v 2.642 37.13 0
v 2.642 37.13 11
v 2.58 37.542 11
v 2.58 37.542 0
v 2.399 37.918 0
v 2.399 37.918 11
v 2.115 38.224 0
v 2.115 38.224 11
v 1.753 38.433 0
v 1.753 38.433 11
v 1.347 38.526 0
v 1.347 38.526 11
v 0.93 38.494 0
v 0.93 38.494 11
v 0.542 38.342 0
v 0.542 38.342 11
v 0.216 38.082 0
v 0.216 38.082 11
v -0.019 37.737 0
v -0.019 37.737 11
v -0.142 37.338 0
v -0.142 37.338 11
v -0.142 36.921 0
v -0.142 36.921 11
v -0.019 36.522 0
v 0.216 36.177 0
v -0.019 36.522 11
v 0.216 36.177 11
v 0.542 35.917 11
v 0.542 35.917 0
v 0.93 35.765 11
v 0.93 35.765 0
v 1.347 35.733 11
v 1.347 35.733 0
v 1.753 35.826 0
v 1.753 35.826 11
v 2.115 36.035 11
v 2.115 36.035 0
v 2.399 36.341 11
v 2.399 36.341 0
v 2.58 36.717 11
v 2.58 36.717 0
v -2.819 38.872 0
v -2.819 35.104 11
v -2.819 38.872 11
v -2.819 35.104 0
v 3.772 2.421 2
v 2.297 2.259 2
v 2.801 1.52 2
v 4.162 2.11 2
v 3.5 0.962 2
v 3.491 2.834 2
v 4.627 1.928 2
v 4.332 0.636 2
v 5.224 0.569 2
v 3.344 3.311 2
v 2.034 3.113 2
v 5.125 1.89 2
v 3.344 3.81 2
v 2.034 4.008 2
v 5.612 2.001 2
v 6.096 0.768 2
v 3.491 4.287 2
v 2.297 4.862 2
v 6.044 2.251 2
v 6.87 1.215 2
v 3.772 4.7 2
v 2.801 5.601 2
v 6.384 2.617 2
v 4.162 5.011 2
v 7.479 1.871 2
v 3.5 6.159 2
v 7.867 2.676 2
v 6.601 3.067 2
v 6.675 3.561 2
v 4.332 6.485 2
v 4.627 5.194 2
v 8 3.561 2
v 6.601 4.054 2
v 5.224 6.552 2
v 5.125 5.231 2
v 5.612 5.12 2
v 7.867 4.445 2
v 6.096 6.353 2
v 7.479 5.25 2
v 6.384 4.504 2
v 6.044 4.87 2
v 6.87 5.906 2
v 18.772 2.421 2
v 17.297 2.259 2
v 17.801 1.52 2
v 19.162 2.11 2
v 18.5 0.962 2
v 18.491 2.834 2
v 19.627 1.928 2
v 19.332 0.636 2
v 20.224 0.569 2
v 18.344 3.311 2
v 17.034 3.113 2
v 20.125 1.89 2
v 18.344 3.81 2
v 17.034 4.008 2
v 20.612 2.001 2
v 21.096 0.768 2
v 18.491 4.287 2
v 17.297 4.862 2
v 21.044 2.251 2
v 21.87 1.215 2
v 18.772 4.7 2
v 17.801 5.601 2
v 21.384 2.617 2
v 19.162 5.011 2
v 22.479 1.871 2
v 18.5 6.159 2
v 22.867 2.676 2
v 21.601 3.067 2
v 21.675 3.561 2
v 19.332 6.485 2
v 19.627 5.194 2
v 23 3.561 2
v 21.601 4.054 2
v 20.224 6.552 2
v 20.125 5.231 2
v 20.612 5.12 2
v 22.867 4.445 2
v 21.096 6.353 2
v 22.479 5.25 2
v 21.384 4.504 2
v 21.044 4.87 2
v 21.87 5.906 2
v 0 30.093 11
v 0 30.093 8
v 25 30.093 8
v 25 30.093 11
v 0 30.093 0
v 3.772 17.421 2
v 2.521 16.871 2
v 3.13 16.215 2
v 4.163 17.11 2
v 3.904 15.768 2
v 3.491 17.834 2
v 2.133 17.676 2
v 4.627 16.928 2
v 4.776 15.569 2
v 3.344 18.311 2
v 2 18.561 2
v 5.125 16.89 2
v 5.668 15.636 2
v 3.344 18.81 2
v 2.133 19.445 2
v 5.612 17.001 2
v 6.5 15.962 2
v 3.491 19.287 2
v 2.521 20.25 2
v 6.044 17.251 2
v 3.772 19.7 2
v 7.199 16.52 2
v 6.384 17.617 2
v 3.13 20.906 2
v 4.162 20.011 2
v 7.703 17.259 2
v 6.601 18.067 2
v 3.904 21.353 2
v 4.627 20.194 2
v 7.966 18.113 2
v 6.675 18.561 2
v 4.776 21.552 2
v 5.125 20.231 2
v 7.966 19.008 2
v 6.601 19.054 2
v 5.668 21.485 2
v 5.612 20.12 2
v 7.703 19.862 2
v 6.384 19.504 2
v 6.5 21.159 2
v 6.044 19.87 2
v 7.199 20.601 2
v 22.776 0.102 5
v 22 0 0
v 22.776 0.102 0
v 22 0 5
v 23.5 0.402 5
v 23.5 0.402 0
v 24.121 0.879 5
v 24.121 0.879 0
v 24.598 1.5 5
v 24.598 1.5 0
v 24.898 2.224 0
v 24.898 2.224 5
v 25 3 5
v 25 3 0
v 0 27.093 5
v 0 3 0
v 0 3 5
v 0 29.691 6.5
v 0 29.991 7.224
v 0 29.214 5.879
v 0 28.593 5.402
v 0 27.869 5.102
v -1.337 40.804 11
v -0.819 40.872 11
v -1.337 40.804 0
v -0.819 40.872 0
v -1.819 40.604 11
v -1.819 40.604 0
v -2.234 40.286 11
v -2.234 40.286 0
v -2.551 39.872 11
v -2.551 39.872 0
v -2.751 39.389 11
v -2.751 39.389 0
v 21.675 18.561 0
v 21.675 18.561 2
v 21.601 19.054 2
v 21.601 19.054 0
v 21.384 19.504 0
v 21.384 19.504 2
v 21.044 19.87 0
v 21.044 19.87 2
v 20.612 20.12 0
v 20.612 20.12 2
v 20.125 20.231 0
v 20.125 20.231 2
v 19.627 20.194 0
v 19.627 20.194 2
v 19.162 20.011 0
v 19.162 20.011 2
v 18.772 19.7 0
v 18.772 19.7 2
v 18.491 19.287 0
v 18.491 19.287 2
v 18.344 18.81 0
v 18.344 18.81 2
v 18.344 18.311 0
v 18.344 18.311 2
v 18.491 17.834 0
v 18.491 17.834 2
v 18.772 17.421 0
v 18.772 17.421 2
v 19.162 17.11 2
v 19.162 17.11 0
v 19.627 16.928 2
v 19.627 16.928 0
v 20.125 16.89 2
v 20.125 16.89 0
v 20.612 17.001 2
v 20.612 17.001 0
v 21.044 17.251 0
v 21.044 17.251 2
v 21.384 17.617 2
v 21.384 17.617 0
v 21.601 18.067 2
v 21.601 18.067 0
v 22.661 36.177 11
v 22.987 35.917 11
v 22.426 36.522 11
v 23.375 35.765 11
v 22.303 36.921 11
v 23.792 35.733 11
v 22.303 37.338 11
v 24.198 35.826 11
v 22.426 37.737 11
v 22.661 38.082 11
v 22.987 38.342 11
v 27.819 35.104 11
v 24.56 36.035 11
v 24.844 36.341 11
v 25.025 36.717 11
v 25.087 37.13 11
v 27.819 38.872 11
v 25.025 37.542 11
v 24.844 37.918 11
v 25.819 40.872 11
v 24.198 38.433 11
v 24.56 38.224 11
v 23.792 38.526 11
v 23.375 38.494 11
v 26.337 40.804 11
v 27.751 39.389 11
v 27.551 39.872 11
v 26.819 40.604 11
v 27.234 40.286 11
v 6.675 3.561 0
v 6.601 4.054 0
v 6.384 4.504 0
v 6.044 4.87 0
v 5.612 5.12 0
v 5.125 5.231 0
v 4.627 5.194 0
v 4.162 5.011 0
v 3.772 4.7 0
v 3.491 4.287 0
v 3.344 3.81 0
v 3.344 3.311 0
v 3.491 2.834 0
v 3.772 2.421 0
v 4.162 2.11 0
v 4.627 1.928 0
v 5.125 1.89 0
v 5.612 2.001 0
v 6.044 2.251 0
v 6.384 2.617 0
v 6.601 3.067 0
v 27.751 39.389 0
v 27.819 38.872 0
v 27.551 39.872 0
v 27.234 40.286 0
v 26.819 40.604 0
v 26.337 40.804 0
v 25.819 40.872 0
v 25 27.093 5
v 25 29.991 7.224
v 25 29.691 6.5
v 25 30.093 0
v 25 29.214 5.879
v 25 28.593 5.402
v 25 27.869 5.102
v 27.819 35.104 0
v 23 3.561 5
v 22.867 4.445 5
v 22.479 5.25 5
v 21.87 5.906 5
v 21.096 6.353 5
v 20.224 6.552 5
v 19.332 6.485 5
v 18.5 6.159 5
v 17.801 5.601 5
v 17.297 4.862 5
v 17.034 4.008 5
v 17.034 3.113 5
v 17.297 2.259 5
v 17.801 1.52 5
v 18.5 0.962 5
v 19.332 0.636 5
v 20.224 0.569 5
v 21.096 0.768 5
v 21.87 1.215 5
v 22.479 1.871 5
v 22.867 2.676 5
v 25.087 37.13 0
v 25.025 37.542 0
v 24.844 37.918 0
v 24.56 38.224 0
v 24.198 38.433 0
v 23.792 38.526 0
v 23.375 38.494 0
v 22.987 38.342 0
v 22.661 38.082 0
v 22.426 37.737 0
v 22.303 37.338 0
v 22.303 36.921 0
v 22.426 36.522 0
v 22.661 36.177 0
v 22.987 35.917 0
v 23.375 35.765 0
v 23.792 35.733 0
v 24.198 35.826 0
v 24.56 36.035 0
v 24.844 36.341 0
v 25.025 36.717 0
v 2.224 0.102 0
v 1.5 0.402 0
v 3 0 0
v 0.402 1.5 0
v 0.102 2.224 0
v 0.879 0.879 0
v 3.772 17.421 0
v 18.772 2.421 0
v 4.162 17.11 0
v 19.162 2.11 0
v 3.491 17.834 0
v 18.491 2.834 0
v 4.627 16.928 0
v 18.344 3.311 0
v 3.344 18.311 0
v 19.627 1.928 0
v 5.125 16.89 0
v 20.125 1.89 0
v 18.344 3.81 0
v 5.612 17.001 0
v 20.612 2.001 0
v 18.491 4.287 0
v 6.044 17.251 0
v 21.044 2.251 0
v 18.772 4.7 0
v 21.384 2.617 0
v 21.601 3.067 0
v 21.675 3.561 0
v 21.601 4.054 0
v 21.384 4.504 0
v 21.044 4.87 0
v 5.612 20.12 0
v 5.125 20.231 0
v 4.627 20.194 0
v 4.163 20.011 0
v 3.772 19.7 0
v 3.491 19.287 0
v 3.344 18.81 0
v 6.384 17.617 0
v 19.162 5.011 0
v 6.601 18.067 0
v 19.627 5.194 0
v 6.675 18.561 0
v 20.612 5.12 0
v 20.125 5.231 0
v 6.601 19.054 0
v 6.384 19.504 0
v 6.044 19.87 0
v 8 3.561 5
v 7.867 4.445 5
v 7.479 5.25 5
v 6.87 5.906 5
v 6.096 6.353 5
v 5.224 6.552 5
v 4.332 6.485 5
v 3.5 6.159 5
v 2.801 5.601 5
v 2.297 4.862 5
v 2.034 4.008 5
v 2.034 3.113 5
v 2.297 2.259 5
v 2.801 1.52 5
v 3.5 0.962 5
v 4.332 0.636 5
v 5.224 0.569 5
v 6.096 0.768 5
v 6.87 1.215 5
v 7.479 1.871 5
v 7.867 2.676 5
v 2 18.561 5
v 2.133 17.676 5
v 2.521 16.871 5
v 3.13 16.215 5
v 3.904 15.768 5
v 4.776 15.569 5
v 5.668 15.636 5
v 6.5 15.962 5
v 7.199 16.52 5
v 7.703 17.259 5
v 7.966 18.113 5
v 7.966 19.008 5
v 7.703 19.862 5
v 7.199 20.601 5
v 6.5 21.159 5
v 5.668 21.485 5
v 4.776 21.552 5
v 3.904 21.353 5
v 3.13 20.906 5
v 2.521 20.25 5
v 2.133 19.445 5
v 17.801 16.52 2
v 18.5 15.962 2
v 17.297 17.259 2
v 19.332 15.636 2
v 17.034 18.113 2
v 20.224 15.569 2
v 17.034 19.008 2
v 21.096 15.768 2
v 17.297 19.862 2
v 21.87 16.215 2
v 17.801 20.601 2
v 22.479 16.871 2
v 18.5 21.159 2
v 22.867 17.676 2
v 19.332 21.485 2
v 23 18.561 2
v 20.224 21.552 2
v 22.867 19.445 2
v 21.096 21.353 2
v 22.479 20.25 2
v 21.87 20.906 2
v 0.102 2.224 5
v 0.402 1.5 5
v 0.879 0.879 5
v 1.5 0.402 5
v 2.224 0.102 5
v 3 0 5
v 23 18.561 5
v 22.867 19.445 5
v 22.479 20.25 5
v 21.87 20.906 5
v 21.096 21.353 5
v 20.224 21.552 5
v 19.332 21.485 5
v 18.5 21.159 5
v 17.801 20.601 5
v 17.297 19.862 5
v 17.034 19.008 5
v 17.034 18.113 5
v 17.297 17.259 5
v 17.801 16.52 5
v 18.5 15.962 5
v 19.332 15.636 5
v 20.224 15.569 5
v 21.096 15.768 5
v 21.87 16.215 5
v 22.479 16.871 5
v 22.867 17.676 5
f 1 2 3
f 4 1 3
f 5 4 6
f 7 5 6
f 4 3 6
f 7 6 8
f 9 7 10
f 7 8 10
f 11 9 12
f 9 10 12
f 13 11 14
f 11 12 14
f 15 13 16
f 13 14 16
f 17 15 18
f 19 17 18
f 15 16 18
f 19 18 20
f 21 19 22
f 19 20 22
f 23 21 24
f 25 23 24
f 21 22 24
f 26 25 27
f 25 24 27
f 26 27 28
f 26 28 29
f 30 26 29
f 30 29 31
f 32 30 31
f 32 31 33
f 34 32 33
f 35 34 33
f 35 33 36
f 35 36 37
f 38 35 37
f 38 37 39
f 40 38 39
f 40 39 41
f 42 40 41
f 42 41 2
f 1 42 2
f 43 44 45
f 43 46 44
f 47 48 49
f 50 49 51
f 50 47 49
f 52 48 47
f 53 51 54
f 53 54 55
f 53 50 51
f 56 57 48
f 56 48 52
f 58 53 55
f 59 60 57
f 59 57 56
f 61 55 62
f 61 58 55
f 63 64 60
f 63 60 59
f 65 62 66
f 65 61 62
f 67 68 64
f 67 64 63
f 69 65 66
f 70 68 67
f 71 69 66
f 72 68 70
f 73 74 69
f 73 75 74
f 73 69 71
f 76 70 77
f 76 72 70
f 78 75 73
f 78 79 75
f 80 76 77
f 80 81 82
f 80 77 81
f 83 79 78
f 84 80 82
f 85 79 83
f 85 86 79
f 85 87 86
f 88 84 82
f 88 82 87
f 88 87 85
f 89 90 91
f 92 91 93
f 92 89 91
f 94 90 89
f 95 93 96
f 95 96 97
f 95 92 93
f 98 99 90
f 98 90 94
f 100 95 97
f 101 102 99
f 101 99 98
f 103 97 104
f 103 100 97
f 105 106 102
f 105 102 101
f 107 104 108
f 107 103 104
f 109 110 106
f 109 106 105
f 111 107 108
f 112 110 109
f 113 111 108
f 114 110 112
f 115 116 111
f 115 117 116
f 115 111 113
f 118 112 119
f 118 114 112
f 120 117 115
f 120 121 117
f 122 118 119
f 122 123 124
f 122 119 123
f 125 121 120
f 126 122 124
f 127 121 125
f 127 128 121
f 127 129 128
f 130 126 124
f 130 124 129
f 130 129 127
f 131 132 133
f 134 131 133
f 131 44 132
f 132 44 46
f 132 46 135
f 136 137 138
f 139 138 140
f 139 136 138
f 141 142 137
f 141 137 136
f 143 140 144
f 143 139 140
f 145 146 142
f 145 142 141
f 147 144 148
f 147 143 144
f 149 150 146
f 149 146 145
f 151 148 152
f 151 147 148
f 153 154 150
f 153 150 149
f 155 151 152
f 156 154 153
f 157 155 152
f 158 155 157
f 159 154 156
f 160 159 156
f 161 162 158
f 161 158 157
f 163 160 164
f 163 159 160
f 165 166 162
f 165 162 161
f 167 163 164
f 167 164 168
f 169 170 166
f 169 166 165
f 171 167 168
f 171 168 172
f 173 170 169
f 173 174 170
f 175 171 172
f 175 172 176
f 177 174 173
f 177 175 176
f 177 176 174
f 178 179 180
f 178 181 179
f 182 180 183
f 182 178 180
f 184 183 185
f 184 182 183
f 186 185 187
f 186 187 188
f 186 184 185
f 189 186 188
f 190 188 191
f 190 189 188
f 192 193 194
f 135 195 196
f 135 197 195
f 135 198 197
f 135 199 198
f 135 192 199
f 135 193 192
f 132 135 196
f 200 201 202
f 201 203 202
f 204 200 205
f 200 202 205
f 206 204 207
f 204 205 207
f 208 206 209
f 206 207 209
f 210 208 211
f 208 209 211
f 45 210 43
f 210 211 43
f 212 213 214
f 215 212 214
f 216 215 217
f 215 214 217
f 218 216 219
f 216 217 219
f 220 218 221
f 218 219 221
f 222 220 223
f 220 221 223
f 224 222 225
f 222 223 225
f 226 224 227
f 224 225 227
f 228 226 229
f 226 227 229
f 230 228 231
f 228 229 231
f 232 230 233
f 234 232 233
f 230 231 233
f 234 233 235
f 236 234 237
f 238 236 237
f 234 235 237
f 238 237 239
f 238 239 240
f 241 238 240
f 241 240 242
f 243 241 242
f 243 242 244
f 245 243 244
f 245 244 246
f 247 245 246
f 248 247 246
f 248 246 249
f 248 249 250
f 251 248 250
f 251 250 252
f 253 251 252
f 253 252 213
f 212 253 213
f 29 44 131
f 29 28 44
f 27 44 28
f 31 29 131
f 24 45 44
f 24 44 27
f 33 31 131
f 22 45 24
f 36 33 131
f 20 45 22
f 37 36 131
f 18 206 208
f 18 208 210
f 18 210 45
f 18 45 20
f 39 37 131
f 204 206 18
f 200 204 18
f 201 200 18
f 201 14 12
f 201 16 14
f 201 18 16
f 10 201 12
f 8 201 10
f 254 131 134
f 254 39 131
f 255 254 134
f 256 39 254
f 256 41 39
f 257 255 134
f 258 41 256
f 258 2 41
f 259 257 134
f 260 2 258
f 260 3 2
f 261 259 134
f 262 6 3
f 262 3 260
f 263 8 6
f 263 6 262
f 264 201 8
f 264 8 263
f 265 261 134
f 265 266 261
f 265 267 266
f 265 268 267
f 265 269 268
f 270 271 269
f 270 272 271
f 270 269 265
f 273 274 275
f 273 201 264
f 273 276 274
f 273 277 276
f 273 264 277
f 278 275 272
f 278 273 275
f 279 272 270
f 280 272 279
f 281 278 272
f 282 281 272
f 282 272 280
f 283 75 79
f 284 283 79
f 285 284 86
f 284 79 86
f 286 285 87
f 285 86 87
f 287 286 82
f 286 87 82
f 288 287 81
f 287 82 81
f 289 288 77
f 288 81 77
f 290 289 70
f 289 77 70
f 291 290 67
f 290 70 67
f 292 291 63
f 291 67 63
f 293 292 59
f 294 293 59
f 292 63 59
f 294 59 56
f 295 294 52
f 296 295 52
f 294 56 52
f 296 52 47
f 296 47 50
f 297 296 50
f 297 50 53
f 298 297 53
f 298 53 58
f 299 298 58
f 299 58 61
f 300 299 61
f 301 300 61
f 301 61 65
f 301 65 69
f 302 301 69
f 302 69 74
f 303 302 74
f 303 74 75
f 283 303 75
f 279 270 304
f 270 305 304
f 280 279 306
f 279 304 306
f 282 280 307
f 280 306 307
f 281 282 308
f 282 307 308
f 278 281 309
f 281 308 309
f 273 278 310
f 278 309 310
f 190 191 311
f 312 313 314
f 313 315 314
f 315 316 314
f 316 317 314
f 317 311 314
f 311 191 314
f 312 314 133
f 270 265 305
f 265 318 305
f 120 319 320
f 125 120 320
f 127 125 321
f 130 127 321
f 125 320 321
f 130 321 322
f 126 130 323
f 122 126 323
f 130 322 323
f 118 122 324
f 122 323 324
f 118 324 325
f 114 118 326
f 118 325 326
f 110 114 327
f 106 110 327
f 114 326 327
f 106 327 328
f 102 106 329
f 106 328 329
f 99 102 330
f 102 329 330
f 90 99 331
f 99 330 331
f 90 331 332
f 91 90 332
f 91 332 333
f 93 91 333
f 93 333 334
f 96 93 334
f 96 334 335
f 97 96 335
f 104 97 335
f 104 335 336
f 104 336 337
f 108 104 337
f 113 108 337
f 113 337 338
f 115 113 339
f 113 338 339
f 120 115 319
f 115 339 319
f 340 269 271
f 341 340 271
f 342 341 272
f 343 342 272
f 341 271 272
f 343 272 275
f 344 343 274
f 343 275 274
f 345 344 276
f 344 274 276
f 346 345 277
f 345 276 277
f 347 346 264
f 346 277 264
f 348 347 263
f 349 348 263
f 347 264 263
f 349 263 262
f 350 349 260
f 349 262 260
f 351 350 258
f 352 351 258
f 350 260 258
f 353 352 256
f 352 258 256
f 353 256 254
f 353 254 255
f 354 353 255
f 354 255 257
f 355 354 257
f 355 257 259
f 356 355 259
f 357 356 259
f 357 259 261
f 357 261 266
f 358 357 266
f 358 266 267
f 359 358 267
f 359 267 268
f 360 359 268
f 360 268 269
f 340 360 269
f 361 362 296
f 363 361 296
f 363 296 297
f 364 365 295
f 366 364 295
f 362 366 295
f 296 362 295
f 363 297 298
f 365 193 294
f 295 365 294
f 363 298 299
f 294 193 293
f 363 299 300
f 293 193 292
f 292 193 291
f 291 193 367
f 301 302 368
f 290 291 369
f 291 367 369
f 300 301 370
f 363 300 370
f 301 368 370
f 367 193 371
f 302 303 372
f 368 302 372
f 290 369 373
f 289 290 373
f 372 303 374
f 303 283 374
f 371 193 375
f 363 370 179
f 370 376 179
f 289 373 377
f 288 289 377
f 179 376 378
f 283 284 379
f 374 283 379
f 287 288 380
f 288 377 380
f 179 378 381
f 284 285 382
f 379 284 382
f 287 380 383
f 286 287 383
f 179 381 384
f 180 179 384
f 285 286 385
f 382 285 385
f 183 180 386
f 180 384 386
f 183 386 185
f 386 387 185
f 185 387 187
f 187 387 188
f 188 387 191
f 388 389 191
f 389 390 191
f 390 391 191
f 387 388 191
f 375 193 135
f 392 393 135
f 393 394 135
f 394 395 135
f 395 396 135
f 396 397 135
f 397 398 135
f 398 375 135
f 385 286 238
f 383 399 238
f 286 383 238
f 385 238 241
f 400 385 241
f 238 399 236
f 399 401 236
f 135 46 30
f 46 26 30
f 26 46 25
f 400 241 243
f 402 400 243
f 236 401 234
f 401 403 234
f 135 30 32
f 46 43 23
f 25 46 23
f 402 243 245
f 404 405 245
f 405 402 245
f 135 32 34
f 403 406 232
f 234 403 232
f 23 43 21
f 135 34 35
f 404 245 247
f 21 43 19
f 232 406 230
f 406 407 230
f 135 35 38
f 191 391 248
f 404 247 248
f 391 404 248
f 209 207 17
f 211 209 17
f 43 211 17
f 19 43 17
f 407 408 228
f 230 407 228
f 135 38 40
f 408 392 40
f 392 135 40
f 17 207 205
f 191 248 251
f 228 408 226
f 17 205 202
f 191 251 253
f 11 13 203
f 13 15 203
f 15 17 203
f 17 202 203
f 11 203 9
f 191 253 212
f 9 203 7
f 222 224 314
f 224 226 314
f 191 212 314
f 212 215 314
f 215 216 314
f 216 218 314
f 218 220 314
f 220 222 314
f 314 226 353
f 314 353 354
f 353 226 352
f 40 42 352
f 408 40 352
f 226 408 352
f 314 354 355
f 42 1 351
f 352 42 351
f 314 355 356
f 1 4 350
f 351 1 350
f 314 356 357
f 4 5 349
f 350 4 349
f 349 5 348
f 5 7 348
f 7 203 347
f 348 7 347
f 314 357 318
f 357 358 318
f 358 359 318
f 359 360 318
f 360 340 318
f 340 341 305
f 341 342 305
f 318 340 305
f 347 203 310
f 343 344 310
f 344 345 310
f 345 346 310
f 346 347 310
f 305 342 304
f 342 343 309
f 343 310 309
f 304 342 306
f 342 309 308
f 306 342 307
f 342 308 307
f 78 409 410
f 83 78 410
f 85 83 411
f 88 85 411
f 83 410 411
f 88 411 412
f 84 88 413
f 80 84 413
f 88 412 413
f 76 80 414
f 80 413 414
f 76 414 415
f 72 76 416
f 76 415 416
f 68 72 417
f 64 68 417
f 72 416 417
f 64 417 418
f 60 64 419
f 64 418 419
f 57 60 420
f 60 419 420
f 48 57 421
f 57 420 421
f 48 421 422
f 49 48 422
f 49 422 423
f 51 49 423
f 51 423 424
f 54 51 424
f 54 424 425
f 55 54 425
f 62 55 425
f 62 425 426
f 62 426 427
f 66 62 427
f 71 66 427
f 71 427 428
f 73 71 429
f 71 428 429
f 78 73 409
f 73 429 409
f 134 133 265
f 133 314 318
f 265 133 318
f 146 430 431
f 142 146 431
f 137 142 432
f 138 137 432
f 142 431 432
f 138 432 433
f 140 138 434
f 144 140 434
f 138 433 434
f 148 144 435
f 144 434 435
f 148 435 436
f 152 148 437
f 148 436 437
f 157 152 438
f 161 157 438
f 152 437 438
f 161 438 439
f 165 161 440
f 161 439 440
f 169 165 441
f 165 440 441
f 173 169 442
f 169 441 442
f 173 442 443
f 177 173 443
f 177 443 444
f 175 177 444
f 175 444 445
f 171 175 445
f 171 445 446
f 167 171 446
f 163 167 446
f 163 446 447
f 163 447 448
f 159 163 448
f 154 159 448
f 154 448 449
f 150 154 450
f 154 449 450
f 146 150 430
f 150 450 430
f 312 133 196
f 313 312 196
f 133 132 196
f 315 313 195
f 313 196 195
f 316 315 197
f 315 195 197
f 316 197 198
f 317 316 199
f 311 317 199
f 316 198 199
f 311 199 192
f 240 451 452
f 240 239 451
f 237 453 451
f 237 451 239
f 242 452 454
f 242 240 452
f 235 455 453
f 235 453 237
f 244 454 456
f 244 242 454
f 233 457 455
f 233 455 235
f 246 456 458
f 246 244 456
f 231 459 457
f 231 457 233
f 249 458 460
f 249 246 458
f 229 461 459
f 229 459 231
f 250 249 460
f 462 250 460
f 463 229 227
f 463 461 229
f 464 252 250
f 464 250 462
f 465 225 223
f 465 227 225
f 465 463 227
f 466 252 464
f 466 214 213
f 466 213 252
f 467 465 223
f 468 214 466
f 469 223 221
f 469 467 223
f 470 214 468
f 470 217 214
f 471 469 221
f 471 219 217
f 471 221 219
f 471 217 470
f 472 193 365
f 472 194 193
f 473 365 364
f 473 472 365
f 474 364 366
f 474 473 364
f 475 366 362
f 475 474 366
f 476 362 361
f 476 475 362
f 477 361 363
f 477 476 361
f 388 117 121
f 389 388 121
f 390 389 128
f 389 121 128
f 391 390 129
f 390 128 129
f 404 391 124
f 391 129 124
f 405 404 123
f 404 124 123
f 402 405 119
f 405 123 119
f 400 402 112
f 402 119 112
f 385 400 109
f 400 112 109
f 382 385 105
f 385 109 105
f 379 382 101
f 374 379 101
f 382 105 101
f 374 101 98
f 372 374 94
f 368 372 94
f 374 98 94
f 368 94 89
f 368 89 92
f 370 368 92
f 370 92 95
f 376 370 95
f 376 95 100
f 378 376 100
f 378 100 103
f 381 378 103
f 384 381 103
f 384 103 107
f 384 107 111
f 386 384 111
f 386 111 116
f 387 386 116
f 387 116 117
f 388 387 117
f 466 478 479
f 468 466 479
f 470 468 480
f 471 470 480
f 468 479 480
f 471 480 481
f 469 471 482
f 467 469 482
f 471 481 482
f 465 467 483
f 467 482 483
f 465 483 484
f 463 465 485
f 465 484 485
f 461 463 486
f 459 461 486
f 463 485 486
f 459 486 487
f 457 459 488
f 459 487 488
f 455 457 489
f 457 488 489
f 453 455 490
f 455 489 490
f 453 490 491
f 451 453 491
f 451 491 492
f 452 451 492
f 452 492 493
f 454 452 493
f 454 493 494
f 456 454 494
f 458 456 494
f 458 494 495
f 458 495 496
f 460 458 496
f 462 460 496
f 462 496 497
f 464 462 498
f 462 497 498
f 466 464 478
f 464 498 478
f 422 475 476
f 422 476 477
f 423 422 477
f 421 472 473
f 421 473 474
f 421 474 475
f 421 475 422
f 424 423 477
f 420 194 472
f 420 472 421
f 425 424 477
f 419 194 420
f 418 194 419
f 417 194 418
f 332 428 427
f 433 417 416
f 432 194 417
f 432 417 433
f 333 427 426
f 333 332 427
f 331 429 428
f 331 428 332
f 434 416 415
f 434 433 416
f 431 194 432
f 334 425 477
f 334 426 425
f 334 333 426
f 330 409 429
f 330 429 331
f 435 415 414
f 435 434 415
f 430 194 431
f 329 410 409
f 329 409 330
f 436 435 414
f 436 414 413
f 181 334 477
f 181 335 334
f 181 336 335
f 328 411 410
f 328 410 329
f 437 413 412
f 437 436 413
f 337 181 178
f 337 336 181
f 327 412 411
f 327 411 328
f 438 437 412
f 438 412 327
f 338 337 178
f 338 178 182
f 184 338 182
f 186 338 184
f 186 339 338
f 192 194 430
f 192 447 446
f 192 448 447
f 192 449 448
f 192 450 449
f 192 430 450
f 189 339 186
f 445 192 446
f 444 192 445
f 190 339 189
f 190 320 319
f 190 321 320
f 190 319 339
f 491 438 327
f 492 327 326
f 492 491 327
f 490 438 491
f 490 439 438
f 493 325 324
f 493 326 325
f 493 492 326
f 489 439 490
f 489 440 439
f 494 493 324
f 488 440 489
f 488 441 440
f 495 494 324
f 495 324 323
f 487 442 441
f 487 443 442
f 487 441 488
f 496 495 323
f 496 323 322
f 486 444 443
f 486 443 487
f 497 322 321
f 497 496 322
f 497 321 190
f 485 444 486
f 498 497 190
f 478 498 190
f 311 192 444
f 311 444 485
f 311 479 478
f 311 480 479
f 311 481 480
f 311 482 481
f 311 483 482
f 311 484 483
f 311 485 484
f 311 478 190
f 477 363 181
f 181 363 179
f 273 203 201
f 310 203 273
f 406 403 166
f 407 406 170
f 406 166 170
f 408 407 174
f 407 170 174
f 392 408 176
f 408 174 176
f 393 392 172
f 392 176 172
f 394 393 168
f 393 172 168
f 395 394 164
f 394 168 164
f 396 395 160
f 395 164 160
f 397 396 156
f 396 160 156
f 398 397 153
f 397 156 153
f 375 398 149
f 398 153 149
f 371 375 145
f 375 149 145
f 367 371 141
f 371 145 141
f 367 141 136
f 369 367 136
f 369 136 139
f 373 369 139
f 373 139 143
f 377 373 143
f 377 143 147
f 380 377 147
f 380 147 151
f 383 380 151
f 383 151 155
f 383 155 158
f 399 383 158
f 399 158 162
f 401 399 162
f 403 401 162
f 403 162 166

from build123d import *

# Parameters (mm, degrees)
F0_W     = 25
F0_H     = 30.0927665085
F0_W_2   = 30.6387297809
F0_H_2   = 5.7677225769
F1_DEPTH = 5
F2_R     = 1.675
F3_DEPTH = 25
F4_R     = 3
F5_DEPTH = 11
F6_R     = 1.4
F7_DEPTH = 11.001
F2_R_2   = 3
F8_DEPTH = 3
F9_R     = 3
F10_R    = 2


# Not quite as in the source:
# - a feature names something its author has since deleted; it is built from what else it names


with BuildPart() as f1:
    # F0 (on Top) → F1 (new body)
    with BuildSketch(Plane.XY):
        with Locations((12.5, 15.0463832542)):
            Rectangle(F0_W, F0_H)
        Polygon((-2.8193648905, 35.1040735841), (0, 30.0927665085), (25, 30.0927665085), (27.8193648905, 35.1040735841), align=None)
        with Locations((12.5, 37.9879348725)):
            Rectangle(F0_W_2, F0_H_2)
    extrude(amount=F1_DEPTH)

    # F2 (on face) → F3 (cut)
    with BuildSketch(Plane.XY.offset(5)):
        with BuildLine():
            ThreePointArc((3.325, 18.5605346784), (5, 16.8855346784), (6.675, 18.5605346784))
            ThreePointArc((6.675, 18.5605346784), (5, 20.2355346784), (3.325, 18.5605346784))
        make_face()
        with Locations((20, 18.5605346784)):
            Circle(F2_R)
        with Locations((20, 3.5605346784)):
            Circle(F2_R)
        with Locations((5, 3.5605346784)):
            Circle(F2_R)
    extrude(amount=-F3_DEPTH, mode=Mode.SUBTRACT)

    # F4
    f4_edges = [f1.edges().sort_by_distance(p)[0] for p in [
        (0, 0, 2.5),
        (25, 0, 2.5),
    ]]
    fillet(f4_edges, radius=F4_R)

    # F0 (on Top) → F5 (join)
    with BuildSketch(Plane.XY):
        with Locations((12.5, 37.9879348725)):
            Rectangle(F0_W_2, F0_H_2)
        Polygon((-2.8193648905, 35.1040735841), (0, 30.0927665085), (25, 30.0927665085), (27.8193648905, 35.1040735841), align=None)
    extrude(amount=F5_DEPTH)

    # F6 (on face) → F7 (cut, through all)
    with BuildSketch(Plane.XY.offset(11)):
        with Locations((23.6868802458, 37.1295362711)):
            Circle(F6_R)
        with BuildLine():
            ThreePointArc((-0.1581197542, 37.1295362711), (1.2418802458, 35.7295362711), (2.6418802458, 37.1295362711))
            ThreePointArc((2.6418802458, 37.1295362711), (1.2418802458, 38.5295362711), (-0.1581197542, 37.1295362711))
        make_face()
    extrude(amount=-F7_DEPTH, mode=Mode.SUBTRACT)

    # F2 (on face) → F8 (cut)
    with BuildSketch(Plane.XY.offset(5)):
        with BuildLine():
            ThreePointArc((8, 18.5605346784), (5, 21.5605346784), (2, 18.5605346784))
            ThreePointArc((2, 18.5605346784), (5, 15.5605346784), (8, 18.5605346784))
        make_face()
        with BuildLine():
            ThreePointArc((3.325, 18.5605346784), (5, 20.2355346784), (6.675, 18.5605346784))
            ThreePointArc((6.675, 18.5605346784), (5, 16.8855346784), (3.325, 18.5605346784))
        make_face(mode=Mode.SUBTRACT)
        with Locations((5, 3.5605346784)):
            Circle(F2_R_2)
        with Locations((5, 3.5605346784)):
            Circle(F2_R, mode=Mode.SUBTRACT)
        with Locations((20, 18.5605346784)):
            Circle(F2_R_2)
        with Locations((20, 18.5605346784)):
            Circle(F2_R, mode=Mode.SUBTRACT)
        with Locations((20, 3.5605346784)):
            Circle(F2_R_2)
        with Locations((20, 3.5605346784)):
            Circle(F2_R, mode=Mode.SUBTRACT)
    extrude(amount=-F8_DEPTH, mode=Mode.SUBTRACT)

    # F9
    f9_edges = [f1.edges().sort_by_distance(p)[0] for p in [
        (12.5, 30.092767, 5),
    ]]
    fillet(f9_edges, radius=F9_R)

    # F10
    f10_edges = [f1.edges().sort_by_distance(p)[0] for p in [
        (27.819365, 40.871796, 5.5),
        (-2.819365, 40.871796, 5.5),
    ]]
    fillet(f10_edges, radius=F10_R)


solid = f1.part
